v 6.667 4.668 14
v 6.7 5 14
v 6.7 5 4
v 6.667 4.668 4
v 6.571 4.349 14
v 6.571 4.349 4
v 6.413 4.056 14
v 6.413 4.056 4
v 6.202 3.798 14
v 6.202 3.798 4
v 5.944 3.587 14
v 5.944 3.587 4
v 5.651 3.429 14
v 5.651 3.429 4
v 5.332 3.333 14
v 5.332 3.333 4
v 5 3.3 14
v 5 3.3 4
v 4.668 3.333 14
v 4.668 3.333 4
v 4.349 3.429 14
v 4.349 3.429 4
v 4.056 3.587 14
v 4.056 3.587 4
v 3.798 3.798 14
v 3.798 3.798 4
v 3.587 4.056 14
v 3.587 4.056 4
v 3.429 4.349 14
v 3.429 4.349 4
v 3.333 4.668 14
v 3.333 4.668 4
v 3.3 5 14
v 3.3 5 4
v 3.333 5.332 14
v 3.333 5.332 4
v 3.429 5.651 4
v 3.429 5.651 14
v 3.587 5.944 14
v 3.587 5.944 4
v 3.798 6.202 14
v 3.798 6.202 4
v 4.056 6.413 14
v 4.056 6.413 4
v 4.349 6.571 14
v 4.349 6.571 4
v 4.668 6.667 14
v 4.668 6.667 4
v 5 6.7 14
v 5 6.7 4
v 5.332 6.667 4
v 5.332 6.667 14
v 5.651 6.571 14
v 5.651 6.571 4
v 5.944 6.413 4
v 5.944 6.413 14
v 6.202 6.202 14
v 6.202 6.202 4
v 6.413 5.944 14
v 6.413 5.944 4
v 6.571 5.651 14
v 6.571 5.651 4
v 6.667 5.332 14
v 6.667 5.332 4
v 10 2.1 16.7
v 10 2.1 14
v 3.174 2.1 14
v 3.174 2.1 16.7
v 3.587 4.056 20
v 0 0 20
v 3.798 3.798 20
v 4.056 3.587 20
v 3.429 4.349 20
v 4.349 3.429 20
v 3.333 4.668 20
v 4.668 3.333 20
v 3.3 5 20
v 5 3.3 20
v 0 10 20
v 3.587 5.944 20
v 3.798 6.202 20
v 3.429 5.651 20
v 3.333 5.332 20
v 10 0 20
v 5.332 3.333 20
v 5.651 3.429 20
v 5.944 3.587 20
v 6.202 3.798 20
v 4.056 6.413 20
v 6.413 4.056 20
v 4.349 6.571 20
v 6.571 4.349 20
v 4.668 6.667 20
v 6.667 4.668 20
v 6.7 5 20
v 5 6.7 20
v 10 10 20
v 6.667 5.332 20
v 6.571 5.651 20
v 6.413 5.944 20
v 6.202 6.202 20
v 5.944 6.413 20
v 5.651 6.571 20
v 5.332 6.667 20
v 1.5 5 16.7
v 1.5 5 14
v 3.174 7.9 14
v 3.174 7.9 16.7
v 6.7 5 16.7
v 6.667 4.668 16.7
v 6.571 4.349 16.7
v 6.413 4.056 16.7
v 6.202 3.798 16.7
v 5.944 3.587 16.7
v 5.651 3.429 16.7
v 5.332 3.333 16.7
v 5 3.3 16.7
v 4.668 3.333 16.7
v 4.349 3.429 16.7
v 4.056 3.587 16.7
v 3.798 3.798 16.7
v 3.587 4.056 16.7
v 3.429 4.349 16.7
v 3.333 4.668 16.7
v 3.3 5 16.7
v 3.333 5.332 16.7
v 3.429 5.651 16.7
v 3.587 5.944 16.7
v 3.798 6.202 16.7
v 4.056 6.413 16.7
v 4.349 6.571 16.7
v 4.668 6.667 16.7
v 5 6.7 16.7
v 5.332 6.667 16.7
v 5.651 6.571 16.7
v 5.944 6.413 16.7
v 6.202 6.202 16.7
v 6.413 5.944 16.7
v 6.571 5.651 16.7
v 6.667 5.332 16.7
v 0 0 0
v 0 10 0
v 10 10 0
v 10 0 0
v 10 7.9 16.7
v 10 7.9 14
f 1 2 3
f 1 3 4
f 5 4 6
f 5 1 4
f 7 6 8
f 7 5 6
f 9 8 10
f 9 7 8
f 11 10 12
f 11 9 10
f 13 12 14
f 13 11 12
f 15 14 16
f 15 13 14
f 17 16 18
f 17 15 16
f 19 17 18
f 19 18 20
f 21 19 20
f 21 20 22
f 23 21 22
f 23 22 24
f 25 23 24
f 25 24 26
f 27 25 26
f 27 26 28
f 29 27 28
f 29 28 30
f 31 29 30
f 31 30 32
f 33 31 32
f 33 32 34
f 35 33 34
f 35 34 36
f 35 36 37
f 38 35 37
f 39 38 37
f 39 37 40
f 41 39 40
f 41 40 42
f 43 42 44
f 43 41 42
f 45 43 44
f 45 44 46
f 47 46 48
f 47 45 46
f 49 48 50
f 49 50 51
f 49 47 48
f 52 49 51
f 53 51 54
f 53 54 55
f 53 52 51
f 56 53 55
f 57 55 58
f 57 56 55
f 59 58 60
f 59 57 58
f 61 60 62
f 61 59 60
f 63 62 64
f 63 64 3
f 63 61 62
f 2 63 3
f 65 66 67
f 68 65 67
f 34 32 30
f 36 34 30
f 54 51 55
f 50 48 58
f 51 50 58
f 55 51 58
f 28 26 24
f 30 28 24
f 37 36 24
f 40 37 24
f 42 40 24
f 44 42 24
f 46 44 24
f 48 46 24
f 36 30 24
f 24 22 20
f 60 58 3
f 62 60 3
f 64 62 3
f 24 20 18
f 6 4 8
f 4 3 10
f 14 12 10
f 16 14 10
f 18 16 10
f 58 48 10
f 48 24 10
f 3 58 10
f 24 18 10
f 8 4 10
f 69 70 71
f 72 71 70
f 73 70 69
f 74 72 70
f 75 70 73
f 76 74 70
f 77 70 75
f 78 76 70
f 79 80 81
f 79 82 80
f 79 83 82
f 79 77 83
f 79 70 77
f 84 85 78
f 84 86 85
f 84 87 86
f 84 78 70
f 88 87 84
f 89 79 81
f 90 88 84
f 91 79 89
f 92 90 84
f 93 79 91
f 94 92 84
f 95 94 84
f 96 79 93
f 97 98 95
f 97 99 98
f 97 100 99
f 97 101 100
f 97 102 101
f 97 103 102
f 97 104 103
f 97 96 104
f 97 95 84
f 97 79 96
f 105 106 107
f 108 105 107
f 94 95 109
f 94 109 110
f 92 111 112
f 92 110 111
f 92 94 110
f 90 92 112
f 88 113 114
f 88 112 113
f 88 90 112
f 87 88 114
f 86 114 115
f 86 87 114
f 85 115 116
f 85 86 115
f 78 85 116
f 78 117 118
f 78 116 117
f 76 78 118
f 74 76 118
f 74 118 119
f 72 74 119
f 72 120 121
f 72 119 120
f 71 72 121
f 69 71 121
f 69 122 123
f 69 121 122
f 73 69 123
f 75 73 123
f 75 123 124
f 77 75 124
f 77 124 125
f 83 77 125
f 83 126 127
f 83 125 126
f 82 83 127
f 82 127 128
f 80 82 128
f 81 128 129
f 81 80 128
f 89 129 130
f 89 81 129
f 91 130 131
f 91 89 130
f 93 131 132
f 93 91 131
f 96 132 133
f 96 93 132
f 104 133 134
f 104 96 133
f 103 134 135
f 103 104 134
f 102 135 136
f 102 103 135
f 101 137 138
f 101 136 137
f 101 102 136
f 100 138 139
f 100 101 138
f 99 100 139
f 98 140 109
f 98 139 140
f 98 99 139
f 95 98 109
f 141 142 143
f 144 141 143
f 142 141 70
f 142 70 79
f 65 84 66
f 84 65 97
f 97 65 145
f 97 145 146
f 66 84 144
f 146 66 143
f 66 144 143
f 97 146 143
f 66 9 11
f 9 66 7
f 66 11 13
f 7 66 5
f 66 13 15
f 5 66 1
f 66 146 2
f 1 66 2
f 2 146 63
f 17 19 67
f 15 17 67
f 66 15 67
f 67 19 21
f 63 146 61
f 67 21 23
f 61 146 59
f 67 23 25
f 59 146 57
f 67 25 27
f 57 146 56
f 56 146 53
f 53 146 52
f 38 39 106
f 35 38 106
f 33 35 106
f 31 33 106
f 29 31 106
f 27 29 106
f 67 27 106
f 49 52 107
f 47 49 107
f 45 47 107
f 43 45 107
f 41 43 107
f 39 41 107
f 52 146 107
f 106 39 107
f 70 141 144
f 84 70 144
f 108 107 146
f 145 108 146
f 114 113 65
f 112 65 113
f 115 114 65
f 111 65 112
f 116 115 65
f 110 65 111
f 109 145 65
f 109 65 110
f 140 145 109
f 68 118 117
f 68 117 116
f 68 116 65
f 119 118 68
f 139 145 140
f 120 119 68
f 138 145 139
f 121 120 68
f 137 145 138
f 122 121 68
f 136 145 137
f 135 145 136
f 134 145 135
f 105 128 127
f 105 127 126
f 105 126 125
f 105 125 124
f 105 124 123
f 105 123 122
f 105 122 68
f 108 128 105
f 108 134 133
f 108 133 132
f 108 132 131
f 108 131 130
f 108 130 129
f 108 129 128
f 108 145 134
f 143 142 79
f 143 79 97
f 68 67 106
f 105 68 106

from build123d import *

# Parameters (mm, degrees)
PAD002_DEPTH             = 2.7
CYLINDER_R               = 2.95
CYLINDER_DEPTH           = 7
CYLINDER001_R            = 1.7
CYLINDER001_DEPTH        = 30
CLONE118_PLACEMENT_ANGLE = 180
BOX250_W                 = 10
BOX250_H                 = 10
BOX250_DEPTH             = 20


with BuildPart() as clone_of_m3nuthousing009:
    # Sketch003 → Pad002 (new body)
    with BuildSketch(Plane.XY):
        Polygon((0, 0), (1.674316, 2.9), (21.674316, 2.9), (21.674316, -2.9), (1.674316, -2.9), align=None)
    extrude(amount=PAD002_DEPTH)


with BuildPart() as clone_of_m3nuthousing009_1:
    # Clone119 placement: moved
    add(clone_of_m3nuthousing009.part.moved(Location((1.5, 5, 14))))


with BuildPart() as m3bolthead:
    # Cylinder → Cylinder (new body)
    with BuildSketch(Plane.XY):
        Circle(CYLINDER_R)
    extrude(amount=CYLINDER_DEPTH)


with BuildPart() as fusion051:
    # Cylinder001 → Cylinder001 (new body)
    with BuildSketch(Plane.XY.offset(6)):
        Circle(CYLINDER001_R)
    extrude(amount=CYLINDER001_DEPTH)

    # Fusion: union M3BoltHead
    add(m3bolthead.part)


with BuildPart() as fusion051_1:
    # Clone118 placement: moved
    add(fusion051.part.moved(Location((5, 5, 40))).rotate(Axis((5, 5, 40), (1, 0, 0)), CLONE118_PLACEMENT_ANGLE))

    # Fusion051: union Clone of M3NutHousing009
    add(clone_of_m3nuthousing009_1.part)


with BuildPart() as art2bodycoverfix:
    # Box250 → Box250 (new body)
    with BuildSketch(Plane.XY):
        with Locations((5, 5)):
            Rectangle(BOX250_W, BOX250_H)
    extrude(amount=BOX250_DEPTH)

    # Cut040: cut Fusion051
    add(fusion051_1.part, mode=Mode.SUBTRACT)


solid = art2bodycoverfix.part
